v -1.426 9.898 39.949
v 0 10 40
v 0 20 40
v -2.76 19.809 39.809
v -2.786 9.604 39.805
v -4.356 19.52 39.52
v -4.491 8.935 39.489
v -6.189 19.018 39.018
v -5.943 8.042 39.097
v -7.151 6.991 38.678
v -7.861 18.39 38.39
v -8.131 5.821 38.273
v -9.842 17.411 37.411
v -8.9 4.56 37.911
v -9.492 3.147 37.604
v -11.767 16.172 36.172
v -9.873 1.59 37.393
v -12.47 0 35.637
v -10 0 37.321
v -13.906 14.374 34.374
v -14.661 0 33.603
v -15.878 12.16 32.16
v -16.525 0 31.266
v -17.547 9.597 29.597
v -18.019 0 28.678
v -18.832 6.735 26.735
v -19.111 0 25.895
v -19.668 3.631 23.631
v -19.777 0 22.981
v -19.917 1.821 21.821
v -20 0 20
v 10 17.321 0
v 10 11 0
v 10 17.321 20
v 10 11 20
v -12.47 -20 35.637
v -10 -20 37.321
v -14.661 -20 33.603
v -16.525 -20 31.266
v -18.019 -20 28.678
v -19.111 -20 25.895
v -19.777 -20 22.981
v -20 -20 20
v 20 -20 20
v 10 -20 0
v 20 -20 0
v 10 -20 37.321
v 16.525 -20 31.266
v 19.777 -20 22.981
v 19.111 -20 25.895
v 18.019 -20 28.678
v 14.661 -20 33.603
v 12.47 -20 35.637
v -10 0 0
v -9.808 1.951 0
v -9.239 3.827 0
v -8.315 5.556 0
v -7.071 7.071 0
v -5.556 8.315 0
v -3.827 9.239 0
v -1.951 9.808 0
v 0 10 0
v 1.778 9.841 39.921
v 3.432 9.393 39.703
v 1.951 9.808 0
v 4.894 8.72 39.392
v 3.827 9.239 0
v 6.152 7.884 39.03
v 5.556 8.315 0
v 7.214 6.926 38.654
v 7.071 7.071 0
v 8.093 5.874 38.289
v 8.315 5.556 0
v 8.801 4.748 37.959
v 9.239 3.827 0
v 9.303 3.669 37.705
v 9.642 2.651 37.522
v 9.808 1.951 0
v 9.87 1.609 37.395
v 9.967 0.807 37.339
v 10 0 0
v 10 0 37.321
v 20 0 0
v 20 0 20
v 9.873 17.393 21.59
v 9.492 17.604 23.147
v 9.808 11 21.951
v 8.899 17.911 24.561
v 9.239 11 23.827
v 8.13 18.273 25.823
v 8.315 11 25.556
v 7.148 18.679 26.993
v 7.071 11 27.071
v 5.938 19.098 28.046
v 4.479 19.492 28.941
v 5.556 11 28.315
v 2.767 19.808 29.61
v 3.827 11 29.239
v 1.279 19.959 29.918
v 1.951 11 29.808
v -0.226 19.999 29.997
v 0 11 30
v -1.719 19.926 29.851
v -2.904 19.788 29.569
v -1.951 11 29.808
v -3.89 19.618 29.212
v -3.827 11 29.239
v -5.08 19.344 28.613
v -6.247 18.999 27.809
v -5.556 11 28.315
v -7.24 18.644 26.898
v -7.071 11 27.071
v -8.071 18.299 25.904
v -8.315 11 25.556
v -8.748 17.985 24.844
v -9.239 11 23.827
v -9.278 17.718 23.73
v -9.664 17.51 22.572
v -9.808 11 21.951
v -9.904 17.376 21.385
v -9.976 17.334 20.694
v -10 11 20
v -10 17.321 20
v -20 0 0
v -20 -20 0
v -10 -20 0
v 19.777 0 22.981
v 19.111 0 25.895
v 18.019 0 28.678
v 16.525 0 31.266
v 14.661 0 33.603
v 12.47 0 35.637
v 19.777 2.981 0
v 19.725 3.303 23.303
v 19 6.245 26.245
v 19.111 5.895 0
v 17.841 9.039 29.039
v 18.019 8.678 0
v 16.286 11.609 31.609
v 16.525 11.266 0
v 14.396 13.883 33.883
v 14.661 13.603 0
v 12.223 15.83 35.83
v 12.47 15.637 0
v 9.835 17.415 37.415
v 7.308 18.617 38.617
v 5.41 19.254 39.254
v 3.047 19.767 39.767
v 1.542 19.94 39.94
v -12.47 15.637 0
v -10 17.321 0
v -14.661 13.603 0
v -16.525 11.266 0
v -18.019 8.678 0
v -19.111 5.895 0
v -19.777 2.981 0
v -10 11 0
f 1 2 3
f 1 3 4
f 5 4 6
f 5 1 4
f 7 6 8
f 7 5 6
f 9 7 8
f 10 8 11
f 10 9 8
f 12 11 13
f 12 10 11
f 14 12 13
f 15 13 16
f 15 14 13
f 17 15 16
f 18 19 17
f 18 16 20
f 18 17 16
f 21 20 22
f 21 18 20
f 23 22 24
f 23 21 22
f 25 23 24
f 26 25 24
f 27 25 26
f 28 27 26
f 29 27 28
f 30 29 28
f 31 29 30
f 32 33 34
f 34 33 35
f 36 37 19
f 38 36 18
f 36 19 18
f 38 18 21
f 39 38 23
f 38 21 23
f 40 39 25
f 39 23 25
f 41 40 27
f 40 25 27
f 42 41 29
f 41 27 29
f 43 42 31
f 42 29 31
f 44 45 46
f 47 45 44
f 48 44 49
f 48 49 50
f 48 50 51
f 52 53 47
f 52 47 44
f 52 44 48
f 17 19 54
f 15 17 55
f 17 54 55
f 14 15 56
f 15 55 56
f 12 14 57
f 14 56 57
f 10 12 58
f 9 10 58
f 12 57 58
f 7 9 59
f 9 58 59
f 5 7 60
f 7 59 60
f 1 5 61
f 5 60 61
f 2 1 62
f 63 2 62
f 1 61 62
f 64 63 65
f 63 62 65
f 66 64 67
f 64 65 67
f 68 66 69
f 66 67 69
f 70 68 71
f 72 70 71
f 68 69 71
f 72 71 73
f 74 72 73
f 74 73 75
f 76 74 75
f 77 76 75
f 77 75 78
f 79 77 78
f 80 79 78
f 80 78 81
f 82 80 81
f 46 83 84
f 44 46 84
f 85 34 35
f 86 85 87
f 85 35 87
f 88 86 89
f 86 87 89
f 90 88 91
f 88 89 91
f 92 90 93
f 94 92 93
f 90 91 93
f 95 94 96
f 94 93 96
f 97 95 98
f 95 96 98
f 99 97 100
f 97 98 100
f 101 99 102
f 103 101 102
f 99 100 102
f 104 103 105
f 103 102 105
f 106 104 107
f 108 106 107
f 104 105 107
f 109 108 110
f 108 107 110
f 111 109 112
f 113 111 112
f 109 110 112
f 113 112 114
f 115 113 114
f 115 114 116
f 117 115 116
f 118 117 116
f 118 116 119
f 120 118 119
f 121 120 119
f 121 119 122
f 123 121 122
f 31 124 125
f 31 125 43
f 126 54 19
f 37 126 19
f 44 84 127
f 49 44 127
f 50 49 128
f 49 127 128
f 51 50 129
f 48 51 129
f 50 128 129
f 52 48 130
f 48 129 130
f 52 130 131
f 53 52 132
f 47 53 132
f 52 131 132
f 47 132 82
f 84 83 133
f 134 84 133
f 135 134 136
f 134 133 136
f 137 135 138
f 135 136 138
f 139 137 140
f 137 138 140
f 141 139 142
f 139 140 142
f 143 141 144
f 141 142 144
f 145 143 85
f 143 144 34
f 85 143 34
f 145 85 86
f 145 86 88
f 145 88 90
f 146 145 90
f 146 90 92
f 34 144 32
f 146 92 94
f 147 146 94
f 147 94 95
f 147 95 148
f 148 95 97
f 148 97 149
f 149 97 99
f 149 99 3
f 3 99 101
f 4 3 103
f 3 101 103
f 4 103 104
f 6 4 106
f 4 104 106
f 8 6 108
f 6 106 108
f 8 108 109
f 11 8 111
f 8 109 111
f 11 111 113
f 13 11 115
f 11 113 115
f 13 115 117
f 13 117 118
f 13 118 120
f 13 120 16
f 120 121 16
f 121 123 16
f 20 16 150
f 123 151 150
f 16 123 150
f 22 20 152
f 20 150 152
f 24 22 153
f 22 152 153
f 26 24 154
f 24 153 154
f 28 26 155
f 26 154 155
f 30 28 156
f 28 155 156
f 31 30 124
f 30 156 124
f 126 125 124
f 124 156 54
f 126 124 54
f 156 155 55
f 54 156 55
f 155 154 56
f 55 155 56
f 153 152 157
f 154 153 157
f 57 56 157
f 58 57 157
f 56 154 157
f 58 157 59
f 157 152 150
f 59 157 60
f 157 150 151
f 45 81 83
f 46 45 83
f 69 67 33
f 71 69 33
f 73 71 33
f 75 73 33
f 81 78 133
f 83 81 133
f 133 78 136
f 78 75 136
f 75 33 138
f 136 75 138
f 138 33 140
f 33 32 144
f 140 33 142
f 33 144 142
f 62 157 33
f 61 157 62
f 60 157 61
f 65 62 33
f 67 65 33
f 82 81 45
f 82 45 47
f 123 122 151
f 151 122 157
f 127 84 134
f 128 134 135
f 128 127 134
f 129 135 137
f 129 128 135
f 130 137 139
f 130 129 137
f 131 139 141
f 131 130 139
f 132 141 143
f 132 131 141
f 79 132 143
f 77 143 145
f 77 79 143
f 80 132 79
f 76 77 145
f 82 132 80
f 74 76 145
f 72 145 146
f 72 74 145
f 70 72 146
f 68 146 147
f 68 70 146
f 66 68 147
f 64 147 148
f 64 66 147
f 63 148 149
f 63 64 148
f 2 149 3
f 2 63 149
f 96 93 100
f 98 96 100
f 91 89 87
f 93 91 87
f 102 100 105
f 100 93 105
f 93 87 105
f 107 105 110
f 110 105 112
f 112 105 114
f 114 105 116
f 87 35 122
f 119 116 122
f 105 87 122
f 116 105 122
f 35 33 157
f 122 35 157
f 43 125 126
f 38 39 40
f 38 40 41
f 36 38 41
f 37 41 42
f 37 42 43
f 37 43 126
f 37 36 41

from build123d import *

# Parameters (mm, degrees)
BOSS_EXTRUDE2_DEPTH     = 40
SKETCH2_W               = 10
SKETCH2_H               = 40
BOSS_EXTRUDE3_DEPTH     = 20
CUT_EXTRUDE1_DEPTH      = 20
CUT_EXTRUDE1_DEPTH_BACK = 20
CUT_EXTRUDE4_DEPTH      = 51


with BuildPart() as part:
    # Sketch1 → Boss-Extrude2 (new body)
    with BuildSketch(Plane.XY):
        with BuildLine():
            ThreePointArc((20, 0), (0, 20), (-20, 0))
            Line((-20, 0), (-10, 0))
            ThreePointArc((-10, 0), (0, 10), (10, 0))
            Line((10, 0), (20, 0))
        make_face()
    extrude(amount=BOSS_EXTRUDE2_DEPTH)

    # Sketch2 → Boss-Extrude3 (add)
    with BuildSketch(Plane.XZ):
        with Locations((-15, 20)):
            Rectangle(SKETCH2_W, SKETCH2_H)
        with Locations((15, 20)):
            Rectangle(SKETCH2_W, SKETCH2_H)
    extrude(amount=BOSS_EXTRUDE3_DEPTH)

    # Sketch3 → Cut-Extrude1 (cut, two sides: drawn at the far end of the back side and taken through both)
    with BuildSketch(Plane(origin=(0, 0, 0), x_dir=(1, 0, 0), z_dir=(0, 1, 0)).offset(-CUT_EXTRUDE1_DEPTH_BACK)):
        with BuildLine():
            ThreePointArc((0, -40), (-14.142135624, -34.142135624), (-20, -20))
            Line((-20, -20), (-20, -40))
            Line((-20, -40), (0, -40))
        make_face()
        with BuildLine():
            ThreePointArc((20, -20), (14.142135624, -34.142135624), (0, -40))
            Line((0, -40), (20, -40))
            Line((20, -40), (20, -20))
        make_face()
    extrude(amount=CUT_EXTRUDE1_DEPTH + CUT_EXTRUDE1_DEPTH_BACK, mode=Mode.SUBTRACT)

    # Sketch6 → Cut-Extrude4 (cut)
    with BuildSketch(Plane(origin=(0, 11, 0), x_dir=(1, 0, 0), z_dir=(0, 1, 0))):
        with BuildLine():
            Line((-10, -20), (-10, 0))
            Line((-10, 0), (10, 0))
            Line((10, 0), (10, -20))
            ThreePointArc((10, -20), (0, -30), (-10, -20))
        make_face()
    extrude(amount=CUT_EXTRUDE4_DEPTH, mode=Mode.SUBTRACT)


solid = part.part
